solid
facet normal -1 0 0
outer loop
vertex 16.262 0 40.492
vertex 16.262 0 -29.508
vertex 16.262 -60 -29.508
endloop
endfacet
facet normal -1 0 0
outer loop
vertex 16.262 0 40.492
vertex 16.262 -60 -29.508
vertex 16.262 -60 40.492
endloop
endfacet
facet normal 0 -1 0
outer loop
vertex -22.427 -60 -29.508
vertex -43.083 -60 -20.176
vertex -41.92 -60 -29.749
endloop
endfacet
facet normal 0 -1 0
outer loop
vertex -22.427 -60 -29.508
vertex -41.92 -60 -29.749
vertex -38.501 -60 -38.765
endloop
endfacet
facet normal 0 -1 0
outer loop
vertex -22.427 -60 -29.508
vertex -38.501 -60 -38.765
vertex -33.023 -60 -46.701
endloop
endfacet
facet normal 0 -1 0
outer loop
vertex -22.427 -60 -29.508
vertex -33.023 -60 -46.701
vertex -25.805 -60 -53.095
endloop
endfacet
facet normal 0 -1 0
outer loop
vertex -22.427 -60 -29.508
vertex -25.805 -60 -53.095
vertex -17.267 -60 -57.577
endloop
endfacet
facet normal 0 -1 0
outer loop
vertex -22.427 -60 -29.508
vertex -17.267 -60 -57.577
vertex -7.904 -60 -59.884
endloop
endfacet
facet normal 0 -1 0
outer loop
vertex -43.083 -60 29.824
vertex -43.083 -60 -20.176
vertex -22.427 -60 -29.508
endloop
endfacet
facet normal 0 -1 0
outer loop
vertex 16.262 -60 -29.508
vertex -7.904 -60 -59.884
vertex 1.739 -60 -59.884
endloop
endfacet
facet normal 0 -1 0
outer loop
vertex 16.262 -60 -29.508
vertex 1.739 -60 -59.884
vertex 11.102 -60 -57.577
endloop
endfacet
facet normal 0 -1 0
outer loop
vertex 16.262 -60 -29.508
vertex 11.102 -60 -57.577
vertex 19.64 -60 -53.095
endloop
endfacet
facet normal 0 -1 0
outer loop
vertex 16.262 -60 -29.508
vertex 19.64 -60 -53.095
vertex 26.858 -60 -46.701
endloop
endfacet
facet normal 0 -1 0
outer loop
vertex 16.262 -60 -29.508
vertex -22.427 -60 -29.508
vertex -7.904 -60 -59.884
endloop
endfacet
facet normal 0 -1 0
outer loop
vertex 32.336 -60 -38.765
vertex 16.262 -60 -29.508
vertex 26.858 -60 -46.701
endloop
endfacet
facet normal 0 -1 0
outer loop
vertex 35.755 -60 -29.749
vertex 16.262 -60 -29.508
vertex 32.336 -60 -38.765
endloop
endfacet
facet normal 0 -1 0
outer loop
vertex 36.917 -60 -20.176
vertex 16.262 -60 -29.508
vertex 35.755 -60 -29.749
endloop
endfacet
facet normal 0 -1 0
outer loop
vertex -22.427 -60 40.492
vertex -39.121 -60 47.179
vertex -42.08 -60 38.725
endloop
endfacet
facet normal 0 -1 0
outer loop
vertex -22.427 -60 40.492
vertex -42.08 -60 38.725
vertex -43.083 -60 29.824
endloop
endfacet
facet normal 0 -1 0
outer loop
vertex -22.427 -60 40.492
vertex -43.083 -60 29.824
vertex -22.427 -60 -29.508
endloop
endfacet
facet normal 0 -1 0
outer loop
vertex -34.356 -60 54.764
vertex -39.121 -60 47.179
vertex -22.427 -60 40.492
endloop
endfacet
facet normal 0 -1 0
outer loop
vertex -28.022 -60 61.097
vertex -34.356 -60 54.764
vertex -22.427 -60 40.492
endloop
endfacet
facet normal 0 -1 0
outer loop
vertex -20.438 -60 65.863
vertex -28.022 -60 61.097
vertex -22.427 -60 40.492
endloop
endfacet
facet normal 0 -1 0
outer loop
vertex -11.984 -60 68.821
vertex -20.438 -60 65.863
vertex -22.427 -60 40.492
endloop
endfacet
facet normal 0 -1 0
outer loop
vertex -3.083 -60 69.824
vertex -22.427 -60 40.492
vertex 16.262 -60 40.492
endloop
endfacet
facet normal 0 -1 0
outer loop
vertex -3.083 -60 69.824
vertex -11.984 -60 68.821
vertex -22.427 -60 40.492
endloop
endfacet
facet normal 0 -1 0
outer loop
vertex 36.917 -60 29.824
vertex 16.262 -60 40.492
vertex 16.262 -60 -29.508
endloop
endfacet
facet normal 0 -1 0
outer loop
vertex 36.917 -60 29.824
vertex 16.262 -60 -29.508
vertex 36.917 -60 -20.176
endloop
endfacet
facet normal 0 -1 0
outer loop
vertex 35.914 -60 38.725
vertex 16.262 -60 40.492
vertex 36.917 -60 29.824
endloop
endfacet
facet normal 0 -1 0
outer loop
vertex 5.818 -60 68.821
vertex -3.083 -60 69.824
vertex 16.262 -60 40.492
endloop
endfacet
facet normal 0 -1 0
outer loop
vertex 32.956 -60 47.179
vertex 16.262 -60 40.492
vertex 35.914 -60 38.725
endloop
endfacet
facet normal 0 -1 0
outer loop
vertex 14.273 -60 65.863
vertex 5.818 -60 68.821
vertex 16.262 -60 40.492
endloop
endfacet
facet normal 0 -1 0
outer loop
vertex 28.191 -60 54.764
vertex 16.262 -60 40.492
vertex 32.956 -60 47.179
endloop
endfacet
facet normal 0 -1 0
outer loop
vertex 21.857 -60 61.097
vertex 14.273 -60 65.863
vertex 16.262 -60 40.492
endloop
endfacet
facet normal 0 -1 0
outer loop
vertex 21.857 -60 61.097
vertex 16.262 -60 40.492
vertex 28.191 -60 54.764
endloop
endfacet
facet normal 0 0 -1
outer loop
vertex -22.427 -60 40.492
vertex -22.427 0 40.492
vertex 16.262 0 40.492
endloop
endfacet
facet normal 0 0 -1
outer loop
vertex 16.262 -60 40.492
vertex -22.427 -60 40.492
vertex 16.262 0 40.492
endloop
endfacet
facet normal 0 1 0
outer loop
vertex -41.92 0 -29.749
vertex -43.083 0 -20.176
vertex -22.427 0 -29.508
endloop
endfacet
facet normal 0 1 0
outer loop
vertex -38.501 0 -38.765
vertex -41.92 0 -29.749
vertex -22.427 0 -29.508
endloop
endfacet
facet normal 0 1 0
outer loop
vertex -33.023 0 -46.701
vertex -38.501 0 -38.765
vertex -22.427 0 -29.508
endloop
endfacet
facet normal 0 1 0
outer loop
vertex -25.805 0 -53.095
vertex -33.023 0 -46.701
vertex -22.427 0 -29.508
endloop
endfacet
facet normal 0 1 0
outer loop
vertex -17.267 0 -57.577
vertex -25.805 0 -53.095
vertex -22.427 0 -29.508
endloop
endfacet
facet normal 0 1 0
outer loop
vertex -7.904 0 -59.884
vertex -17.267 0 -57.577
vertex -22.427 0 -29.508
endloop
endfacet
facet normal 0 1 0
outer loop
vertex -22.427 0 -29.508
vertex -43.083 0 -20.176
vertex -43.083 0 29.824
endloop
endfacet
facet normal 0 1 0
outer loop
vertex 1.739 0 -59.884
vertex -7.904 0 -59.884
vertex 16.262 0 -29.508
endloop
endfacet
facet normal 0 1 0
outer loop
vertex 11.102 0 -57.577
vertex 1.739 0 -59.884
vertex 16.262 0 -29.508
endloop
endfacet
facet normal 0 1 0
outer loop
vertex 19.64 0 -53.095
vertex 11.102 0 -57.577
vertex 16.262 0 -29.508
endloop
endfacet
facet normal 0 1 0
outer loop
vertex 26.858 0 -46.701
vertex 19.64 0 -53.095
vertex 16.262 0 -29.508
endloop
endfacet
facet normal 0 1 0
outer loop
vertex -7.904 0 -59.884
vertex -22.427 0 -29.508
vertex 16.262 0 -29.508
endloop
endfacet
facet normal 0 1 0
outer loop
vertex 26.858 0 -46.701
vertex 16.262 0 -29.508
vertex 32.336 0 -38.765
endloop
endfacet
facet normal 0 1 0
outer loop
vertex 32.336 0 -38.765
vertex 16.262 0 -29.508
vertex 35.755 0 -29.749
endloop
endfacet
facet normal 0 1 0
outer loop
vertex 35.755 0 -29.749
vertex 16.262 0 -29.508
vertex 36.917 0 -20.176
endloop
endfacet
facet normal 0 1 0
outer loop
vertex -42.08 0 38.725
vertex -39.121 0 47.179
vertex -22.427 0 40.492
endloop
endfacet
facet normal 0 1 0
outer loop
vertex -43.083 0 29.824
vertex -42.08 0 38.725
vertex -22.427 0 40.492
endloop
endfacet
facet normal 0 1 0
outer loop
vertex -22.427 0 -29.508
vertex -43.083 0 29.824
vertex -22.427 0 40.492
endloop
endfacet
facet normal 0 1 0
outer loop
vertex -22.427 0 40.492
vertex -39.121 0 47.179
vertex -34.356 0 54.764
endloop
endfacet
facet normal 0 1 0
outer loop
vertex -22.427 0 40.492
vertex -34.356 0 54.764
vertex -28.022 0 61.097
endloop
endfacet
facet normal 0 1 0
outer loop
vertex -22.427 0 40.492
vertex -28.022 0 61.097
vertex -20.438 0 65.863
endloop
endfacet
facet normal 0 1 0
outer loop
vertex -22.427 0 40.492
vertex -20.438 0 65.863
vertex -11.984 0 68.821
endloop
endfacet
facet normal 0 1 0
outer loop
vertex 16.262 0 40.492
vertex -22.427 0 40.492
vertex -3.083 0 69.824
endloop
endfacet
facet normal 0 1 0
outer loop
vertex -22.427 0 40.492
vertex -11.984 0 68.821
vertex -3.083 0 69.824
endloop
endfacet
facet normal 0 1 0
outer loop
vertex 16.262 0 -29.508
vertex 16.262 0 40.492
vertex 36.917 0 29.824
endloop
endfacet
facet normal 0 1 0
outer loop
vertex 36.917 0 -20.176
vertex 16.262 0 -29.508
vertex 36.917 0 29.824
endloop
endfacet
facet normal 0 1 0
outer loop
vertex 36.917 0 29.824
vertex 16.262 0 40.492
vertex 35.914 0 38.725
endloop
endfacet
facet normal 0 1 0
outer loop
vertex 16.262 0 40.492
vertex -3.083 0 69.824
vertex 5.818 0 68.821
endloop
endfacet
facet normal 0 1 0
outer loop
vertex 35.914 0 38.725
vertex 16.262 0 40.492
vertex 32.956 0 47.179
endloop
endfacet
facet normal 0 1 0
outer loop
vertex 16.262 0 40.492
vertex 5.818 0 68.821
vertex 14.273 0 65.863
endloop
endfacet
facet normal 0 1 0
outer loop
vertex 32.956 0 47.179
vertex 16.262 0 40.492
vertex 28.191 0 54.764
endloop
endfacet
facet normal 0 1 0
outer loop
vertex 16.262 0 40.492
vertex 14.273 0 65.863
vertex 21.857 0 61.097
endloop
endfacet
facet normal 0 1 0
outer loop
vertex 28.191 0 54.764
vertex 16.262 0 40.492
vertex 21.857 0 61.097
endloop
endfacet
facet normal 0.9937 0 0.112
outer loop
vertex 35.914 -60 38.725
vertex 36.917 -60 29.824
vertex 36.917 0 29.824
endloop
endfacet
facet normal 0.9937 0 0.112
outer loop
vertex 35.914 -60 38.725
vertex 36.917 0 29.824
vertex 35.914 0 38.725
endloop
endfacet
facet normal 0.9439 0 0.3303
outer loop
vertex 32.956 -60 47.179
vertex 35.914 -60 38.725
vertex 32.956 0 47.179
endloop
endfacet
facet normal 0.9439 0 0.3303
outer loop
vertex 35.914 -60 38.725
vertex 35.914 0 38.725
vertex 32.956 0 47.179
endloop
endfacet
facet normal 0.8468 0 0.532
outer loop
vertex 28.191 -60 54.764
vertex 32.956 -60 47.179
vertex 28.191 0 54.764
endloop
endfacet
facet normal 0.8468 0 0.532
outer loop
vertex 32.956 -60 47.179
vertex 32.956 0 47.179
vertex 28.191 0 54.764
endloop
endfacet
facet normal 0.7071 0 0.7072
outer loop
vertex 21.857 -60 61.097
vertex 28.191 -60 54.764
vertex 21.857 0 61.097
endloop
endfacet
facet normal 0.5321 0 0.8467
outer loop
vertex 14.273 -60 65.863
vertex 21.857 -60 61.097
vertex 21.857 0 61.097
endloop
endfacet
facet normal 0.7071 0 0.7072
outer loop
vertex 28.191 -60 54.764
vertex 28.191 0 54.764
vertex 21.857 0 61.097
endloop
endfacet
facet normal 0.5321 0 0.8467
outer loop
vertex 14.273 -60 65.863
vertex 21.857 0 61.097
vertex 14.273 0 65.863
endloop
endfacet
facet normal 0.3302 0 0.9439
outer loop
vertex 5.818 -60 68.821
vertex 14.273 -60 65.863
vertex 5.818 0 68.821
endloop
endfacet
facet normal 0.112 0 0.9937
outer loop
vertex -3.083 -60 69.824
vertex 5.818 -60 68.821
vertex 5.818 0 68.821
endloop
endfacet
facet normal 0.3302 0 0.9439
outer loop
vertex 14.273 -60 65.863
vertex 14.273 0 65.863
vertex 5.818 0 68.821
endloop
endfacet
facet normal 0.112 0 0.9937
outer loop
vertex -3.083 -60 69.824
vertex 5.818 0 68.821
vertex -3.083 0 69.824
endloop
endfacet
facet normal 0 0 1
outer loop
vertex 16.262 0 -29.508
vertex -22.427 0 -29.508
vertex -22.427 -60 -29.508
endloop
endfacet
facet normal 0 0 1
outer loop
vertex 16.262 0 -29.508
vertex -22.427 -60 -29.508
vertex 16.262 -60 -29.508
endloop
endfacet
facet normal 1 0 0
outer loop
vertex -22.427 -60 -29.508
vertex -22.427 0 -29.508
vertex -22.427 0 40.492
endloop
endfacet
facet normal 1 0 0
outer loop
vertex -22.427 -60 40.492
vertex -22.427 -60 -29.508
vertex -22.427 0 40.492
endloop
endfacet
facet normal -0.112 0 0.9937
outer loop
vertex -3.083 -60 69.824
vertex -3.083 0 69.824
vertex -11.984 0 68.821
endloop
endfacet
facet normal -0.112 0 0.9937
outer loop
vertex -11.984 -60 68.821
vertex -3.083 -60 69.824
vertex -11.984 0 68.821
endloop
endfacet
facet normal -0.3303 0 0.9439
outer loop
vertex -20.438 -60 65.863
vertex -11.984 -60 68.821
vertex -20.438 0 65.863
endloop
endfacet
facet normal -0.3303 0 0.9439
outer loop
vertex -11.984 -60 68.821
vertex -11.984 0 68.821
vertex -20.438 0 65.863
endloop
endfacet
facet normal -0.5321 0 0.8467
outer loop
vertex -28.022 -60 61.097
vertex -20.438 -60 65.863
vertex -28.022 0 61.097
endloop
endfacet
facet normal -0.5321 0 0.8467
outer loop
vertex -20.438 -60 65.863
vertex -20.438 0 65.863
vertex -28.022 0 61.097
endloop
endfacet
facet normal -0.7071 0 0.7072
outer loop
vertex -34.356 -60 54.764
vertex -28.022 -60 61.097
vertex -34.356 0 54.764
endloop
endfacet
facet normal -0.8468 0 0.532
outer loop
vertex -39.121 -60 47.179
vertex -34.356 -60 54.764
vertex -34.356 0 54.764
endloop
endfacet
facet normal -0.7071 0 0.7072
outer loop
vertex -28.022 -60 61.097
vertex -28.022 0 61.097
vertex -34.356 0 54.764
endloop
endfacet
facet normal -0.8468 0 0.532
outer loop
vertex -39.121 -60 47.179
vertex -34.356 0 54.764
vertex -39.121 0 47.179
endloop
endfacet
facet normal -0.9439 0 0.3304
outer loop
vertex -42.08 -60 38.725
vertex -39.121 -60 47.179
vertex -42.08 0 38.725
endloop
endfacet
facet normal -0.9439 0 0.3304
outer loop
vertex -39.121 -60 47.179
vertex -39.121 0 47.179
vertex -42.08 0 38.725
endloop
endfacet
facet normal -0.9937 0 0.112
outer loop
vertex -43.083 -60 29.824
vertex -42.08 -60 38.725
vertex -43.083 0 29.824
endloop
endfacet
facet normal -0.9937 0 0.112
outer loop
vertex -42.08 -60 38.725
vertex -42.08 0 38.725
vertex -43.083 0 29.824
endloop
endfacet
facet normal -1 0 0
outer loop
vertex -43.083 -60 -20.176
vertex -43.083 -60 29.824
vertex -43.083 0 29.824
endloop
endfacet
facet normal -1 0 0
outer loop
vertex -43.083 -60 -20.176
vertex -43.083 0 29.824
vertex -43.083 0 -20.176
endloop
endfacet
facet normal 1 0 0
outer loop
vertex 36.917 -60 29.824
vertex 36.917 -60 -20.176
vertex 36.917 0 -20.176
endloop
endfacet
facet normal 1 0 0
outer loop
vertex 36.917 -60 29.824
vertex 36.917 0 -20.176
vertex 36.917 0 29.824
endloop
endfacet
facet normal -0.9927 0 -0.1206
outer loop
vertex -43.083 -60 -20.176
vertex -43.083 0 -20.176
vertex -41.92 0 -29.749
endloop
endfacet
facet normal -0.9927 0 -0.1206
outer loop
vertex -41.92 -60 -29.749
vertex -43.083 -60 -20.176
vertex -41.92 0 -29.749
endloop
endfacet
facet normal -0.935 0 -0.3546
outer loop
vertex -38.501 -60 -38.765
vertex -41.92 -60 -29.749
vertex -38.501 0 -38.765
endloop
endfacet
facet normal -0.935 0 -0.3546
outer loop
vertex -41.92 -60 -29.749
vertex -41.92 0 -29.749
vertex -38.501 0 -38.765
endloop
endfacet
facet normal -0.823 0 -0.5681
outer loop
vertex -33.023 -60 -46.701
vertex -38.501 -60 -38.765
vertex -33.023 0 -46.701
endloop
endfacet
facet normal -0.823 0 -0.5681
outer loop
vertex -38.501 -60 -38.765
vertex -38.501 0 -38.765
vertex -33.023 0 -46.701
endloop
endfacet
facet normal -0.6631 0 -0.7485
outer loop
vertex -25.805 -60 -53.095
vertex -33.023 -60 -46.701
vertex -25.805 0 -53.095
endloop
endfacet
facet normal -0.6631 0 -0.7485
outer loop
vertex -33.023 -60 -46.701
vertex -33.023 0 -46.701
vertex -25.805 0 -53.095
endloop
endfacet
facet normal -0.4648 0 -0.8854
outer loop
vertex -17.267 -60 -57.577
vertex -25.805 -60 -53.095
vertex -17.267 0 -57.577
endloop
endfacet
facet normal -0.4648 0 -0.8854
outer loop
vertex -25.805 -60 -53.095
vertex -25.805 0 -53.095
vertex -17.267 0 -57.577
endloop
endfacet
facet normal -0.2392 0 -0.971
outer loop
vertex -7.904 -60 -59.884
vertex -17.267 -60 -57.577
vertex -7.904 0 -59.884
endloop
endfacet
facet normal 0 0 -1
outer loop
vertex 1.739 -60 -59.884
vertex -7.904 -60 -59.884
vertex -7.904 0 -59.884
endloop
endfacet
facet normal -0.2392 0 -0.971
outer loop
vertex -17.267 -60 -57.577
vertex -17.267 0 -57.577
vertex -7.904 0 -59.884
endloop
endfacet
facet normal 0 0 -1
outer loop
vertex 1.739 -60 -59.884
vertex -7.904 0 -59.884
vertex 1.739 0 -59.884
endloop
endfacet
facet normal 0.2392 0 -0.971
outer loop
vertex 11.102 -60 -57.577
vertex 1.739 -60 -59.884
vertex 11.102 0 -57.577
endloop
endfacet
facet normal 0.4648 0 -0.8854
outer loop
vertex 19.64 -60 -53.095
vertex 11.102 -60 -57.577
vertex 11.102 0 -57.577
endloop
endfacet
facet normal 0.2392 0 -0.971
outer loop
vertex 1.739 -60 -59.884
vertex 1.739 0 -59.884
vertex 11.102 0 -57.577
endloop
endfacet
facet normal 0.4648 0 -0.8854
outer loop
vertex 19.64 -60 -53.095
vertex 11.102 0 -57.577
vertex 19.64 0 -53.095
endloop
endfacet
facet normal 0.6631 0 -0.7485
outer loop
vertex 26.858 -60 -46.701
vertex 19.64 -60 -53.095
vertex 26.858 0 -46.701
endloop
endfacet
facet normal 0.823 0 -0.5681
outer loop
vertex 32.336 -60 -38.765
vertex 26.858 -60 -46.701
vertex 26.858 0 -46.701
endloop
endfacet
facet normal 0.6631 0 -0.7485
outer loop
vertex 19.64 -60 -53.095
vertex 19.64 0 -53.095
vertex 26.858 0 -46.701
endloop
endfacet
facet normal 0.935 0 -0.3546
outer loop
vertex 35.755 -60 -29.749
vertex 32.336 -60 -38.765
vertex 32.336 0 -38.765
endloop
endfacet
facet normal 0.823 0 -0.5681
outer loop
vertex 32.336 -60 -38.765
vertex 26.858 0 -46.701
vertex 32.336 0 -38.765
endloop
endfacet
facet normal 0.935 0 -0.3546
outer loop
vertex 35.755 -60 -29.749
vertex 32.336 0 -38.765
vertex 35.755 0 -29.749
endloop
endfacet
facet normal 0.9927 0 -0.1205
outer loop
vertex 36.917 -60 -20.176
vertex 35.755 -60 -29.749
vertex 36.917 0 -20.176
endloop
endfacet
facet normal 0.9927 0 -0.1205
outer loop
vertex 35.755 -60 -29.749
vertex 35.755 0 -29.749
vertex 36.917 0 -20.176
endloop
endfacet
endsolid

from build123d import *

# Parameters (mm, degrees)
F0_W     = 38.68904
F0_H     = 70
F1_DEPTH = 60


with BuildPart() as f1:
    # F0 (on Front) → F1 (new body)
    with BuildSketch(Plane.XZ):
        with BuildLine():
            ThreePointArc((-3.082677, 69.82396), (-31.366948, 58.108231), (-43.082677, 29.82396))
            Line((-43.082677, 29.82396), (-43.082677, -20.17604))
            ThreePointArc((-43.082677, -20.17604), (-3.082677, -60.17604), (36.917323, -20.17604))
            Line((36.917323, -20.17604), (36.917323, 29.82396))
            ThreePointArc((36.917323, 29.82396), (25.201594, 58.108231), (-3.082677, 69.82396))
        make_face()
        with Locations((-3.082677, 5.491615)):
            Rectangle(F0_W, F0_H, mode=Mode.SUBTRACT)
    extrude(amount=F1_DEPTH)


solid = f1.part
